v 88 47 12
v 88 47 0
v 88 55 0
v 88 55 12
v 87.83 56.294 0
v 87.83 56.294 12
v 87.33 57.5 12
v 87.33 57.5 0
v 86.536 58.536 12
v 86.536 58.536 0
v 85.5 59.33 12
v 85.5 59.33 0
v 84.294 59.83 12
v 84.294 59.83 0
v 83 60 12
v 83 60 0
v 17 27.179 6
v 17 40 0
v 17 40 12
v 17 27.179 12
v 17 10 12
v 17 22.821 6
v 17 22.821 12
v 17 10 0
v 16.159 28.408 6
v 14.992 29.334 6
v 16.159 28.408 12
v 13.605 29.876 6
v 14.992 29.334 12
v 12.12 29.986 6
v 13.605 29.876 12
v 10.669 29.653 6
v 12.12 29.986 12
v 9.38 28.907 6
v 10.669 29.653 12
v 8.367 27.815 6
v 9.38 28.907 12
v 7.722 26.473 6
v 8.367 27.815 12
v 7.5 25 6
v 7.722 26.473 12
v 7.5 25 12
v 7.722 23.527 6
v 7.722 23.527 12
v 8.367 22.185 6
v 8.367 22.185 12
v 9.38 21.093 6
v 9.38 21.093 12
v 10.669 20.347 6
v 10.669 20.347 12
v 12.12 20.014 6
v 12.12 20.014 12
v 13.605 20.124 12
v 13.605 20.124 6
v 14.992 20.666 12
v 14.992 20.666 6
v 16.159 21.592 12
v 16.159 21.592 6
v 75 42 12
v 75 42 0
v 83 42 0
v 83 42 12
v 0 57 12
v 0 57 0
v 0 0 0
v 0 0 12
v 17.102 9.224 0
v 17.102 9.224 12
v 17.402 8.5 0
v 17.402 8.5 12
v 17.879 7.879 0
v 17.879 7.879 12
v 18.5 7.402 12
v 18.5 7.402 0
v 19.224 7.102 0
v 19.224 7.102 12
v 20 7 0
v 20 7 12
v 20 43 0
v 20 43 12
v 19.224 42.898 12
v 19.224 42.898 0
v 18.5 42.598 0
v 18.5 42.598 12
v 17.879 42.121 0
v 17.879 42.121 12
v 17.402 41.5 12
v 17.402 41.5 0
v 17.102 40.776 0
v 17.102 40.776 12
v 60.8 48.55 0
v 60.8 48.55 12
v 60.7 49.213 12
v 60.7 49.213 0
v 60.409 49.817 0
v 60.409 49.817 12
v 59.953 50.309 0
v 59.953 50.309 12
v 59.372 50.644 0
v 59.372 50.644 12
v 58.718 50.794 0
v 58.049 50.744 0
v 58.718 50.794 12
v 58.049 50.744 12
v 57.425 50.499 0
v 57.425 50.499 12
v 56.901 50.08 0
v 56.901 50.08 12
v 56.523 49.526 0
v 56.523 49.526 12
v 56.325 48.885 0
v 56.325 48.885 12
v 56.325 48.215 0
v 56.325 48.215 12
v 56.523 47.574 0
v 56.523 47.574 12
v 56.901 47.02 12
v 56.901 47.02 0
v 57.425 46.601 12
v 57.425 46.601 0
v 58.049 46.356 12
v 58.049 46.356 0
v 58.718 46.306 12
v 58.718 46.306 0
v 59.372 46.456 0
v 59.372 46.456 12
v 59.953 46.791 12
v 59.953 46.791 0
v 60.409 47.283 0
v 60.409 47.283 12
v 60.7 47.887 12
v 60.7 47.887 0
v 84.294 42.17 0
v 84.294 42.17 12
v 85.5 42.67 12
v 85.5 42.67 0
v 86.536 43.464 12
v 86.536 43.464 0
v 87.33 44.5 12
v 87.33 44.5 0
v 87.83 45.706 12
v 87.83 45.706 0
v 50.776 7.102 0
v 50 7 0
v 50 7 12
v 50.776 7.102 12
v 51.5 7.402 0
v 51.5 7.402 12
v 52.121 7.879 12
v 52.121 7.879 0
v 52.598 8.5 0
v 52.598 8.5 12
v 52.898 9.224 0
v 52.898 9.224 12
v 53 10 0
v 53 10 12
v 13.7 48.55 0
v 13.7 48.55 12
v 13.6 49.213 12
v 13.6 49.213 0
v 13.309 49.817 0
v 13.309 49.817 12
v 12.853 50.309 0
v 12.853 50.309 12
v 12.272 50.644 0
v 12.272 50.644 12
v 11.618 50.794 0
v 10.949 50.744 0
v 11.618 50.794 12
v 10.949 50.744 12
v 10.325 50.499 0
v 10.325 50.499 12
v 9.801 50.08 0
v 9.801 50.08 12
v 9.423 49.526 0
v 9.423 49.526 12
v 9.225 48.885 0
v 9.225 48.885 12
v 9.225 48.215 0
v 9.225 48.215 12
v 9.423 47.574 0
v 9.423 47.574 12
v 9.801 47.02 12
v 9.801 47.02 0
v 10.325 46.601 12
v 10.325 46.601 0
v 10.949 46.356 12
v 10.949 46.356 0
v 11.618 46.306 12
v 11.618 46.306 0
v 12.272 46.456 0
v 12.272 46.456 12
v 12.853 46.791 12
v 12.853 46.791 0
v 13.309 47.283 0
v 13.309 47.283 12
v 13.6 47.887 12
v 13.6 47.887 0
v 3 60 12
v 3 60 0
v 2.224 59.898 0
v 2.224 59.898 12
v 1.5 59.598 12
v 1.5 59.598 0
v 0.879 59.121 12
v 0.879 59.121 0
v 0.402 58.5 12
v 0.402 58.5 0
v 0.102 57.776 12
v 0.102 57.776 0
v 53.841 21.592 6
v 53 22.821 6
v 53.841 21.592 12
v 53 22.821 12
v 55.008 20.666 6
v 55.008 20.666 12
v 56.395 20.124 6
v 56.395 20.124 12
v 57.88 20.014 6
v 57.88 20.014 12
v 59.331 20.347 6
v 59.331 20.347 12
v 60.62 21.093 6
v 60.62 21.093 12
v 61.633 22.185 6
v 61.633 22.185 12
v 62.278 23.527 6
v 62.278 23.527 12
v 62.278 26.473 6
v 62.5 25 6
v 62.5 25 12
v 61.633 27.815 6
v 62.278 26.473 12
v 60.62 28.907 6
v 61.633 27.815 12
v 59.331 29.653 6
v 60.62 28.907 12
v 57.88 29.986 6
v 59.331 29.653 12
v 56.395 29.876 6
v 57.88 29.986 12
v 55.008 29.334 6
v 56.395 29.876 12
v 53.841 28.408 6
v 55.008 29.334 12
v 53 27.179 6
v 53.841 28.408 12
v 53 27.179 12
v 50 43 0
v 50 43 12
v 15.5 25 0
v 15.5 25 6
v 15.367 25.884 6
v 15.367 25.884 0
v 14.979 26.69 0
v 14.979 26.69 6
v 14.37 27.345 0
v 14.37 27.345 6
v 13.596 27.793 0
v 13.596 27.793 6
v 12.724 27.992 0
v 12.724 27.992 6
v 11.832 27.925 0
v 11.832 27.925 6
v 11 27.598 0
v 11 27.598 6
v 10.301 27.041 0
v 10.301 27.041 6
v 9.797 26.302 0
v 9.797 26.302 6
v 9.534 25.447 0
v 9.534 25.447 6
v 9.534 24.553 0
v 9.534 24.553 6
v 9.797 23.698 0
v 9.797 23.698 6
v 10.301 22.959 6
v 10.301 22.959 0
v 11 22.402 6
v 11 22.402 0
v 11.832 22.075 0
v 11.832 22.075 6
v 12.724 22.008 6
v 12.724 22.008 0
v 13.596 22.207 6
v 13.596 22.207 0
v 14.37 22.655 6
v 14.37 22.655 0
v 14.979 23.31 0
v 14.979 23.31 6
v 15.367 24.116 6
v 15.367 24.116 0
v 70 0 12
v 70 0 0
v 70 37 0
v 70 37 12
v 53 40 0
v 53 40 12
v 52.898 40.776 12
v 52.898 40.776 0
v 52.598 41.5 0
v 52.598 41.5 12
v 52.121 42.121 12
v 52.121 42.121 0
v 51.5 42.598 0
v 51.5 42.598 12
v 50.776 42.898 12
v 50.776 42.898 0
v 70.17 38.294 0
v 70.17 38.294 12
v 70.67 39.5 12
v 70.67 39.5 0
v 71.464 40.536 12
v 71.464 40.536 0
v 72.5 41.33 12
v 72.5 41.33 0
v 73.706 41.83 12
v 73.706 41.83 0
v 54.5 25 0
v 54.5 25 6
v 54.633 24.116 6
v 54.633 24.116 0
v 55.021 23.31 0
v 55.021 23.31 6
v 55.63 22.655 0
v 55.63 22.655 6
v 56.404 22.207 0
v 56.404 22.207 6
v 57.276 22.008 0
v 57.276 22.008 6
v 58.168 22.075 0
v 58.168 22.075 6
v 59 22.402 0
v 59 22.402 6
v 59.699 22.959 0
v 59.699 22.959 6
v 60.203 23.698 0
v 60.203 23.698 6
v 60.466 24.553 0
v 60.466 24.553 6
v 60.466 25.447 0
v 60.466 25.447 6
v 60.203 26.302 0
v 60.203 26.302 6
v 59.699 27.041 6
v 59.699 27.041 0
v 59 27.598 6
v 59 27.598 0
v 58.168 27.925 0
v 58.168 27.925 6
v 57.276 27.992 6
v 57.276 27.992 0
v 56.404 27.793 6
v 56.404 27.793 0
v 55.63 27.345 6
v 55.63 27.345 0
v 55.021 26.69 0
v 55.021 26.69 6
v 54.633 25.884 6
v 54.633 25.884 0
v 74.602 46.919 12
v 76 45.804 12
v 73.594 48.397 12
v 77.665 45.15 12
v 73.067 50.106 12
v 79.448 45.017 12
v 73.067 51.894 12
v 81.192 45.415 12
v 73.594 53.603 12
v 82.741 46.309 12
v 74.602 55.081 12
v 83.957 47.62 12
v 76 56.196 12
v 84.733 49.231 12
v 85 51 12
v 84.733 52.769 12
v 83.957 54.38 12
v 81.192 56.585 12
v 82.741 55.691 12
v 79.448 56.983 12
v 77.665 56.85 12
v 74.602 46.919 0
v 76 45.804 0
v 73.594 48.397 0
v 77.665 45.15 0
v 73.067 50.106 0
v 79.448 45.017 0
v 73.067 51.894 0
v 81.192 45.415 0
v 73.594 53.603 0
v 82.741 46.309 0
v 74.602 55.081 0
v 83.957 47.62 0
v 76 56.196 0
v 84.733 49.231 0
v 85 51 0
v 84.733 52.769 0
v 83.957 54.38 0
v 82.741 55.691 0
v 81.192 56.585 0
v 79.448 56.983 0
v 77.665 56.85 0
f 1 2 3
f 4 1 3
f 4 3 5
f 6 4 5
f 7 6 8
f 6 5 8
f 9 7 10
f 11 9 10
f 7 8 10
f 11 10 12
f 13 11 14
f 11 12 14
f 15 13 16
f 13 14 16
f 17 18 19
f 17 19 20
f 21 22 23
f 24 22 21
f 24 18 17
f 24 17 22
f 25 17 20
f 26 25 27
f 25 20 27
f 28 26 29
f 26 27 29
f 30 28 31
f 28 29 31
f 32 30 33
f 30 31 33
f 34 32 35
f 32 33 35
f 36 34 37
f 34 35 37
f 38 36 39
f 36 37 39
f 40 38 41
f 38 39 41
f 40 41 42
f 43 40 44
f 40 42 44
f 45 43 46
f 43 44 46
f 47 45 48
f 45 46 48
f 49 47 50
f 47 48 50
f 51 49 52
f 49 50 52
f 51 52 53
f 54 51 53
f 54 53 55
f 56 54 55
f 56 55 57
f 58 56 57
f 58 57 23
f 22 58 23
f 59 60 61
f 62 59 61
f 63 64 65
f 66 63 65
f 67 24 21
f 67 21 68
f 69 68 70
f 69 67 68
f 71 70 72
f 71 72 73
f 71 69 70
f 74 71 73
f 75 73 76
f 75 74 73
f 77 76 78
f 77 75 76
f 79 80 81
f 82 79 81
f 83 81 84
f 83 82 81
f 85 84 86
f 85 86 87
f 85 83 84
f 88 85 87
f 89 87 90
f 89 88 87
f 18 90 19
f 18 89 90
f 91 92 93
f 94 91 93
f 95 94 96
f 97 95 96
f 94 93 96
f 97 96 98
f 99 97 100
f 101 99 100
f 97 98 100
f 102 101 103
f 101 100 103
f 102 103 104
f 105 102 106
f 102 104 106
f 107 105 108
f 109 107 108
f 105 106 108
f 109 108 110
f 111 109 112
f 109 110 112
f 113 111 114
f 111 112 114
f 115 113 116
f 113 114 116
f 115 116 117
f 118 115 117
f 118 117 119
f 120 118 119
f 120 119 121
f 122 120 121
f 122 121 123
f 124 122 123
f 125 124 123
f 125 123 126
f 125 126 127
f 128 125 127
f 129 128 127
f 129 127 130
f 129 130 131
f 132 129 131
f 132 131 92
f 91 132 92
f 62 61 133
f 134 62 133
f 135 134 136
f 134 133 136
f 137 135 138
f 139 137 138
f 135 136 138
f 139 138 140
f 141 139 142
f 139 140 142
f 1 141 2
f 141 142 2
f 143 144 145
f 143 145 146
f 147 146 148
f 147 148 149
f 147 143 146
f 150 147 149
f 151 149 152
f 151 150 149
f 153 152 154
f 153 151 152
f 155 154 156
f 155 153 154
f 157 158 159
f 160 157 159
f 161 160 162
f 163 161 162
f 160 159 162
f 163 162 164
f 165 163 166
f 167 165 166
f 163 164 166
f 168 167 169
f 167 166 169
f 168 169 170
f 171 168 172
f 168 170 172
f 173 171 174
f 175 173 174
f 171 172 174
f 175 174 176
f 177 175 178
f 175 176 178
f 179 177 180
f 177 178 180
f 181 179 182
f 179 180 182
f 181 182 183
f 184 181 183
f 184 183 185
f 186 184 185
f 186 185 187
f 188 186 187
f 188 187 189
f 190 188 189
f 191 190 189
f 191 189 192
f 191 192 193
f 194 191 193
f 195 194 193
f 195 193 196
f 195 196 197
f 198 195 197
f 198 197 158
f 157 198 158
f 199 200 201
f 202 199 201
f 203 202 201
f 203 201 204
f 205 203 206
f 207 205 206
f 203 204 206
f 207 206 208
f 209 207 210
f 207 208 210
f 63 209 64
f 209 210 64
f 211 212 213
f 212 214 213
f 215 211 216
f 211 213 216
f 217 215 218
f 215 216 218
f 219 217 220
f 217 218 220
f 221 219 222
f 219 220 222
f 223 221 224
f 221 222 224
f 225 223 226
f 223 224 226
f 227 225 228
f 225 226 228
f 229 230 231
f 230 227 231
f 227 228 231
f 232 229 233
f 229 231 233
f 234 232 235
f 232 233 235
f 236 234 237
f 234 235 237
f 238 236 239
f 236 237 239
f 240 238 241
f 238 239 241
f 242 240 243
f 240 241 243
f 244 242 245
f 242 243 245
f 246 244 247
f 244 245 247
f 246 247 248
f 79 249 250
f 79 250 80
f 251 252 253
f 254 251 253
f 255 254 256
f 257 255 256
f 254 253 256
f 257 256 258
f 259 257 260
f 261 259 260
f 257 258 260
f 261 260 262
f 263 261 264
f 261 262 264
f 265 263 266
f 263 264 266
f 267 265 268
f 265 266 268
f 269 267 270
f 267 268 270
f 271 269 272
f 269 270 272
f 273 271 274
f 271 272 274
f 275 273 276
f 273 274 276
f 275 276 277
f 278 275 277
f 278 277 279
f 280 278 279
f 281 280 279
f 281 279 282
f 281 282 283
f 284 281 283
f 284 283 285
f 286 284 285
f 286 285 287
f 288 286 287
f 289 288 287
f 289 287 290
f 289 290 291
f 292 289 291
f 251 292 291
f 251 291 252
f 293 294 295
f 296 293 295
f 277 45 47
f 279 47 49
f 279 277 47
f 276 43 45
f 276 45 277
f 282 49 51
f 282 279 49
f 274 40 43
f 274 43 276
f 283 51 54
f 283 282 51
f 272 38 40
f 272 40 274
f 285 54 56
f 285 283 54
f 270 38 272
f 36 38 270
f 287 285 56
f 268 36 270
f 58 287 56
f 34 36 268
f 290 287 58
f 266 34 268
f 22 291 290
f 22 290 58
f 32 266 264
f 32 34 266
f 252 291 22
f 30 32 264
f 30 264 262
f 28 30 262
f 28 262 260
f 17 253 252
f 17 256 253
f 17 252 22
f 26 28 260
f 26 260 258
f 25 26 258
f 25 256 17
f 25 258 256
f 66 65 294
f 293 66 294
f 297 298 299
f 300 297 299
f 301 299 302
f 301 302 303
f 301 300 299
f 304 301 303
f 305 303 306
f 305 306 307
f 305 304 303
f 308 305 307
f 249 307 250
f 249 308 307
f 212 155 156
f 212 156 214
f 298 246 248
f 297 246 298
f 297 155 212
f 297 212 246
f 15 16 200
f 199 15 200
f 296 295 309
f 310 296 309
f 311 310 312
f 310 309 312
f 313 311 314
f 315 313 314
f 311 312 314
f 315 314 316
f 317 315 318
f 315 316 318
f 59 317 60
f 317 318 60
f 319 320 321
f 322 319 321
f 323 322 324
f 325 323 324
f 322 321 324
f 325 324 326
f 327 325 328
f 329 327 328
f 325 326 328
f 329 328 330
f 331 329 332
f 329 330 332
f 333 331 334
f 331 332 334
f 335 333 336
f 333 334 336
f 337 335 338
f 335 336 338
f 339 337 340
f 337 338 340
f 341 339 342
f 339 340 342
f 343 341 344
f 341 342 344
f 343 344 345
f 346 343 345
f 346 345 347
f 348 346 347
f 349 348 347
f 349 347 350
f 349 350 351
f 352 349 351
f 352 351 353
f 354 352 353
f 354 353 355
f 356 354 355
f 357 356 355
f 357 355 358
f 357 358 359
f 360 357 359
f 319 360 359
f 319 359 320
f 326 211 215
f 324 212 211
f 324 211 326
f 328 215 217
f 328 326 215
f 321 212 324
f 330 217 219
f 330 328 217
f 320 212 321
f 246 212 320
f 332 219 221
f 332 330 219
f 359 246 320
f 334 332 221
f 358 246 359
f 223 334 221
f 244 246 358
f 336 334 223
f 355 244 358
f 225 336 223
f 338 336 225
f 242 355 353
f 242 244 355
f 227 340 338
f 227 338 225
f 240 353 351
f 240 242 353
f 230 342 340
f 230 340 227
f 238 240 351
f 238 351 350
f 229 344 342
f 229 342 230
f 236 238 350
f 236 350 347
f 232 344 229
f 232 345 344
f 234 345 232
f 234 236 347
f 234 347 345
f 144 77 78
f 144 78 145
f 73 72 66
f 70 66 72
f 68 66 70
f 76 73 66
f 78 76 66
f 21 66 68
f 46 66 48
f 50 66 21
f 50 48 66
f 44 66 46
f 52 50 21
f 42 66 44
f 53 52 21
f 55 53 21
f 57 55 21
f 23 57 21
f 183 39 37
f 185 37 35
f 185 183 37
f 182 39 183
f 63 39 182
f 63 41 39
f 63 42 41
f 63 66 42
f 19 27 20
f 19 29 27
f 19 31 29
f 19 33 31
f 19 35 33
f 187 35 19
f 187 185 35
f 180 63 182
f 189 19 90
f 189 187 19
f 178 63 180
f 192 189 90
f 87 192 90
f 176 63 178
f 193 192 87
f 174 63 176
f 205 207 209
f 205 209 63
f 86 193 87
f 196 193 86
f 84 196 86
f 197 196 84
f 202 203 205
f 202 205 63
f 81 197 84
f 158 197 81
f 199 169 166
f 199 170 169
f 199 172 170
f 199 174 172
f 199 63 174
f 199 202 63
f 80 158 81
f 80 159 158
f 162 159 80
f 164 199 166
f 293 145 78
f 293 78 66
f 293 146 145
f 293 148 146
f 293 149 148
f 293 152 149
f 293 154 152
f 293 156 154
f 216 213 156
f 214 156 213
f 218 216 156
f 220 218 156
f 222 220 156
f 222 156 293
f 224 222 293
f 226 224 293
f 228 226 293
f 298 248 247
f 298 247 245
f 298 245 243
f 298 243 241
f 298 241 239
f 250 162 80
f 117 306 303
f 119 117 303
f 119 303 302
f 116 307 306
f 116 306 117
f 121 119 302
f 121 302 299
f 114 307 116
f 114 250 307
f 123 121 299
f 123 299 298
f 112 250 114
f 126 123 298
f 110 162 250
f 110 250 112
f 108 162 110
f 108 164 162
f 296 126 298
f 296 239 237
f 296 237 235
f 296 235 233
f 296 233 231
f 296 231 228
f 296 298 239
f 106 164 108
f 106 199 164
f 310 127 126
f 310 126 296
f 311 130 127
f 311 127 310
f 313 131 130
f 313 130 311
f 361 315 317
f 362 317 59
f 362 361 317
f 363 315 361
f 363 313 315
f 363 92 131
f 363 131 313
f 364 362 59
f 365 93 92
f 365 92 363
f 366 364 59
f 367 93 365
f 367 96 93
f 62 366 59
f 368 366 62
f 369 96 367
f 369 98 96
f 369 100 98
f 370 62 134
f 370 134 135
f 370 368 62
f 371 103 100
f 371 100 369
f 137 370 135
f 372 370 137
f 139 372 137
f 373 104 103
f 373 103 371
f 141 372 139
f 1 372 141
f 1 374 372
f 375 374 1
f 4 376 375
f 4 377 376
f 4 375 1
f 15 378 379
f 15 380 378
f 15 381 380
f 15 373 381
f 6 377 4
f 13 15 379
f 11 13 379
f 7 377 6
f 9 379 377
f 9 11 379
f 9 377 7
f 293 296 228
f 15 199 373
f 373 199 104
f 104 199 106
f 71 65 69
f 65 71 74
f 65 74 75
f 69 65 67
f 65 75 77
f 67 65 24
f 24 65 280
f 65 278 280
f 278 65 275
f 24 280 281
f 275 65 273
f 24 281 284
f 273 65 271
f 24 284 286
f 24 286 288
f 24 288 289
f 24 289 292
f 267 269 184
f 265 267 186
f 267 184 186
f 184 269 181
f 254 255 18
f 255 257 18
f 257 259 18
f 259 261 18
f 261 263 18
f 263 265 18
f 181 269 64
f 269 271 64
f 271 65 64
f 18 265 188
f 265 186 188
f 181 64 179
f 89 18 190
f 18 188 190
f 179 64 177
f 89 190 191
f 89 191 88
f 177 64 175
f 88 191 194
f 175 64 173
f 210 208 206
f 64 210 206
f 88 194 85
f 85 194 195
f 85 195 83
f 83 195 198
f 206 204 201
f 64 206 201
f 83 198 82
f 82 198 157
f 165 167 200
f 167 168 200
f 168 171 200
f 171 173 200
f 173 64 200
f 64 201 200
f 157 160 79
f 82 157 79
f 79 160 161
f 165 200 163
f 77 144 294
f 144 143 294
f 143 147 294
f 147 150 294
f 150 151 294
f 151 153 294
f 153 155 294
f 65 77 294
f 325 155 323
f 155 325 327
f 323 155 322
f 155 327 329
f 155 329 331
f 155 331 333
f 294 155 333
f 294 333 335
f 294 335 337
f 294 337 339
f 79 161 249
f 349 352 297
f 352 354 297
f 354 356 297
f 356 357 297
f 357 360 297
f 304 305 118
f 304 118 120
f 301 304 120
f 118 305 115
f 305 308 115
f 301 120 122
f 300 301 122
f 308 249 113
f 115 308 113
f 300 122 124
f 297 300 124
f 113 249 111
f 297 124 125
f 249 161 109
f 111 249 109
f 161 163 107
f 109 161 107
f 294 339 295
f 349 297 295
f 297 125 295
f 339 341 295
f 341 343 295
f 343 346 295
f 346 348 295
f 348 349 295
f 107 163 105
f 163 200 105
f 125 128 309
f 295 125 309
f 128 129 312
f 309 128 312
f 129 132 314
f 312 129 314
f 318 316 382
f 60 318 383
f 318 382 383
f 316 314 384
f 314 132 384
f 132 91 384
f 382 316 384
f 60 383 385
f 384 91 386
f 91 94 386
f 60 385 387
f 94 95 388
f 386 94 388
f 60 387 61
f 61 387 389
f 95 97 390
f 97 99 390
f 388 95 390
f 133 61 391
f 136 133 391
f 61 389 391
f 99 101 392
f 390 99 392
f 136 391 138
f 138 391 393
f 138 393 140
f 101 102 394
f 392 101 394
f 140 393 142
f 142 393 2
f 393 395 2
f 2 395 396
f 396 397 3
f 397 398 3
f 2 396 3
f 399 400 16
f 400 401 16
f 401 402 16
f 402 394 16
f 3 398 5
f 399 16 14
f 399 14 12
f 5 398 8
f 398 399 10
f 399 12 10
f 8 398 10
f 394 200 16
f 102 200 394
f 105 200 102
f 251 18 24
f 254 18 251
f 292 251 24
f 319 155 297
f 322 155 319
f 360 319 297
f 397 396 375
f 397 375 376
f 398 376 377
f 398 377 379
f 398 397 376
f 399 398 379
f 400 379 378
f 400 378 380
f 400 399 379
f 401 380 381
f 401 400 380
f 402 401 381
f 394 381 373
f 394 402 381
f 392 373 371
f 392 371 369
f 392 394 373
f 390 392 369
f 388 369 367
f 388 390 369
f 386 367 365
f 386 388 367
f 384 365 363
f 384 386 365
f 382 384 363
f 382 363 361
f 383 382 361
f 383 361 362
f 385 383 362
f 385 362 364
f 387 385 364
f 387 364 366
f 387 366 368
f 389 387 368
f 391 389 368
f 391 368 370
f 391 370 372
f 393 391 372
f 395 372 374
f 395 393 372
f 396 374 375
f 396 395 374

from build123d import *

# Parameters (mm, degrees)
ESQUISSE1_R             = 6
BOSS_EXTRU_1_DEPTH      = 12
ESQUISSE2_R             = 3
ENL_V_MAT_EXTRU_1_DEPTH = 12
ESQUISSE3_R             = 5
ENL_V_MAT_EXTRU_2_DEPTH = 6
ENL_V_MAT_EXTRU_3_REACH = 109.182
ESQUISSE4_R             = 2.25


with BuildPart() as part:
    # Esquisse1 → Boss.-Extru.1 (new body)
    with BuildSketch(Plane.XY):
        with BuildLine():
            Line((0, 0), (70, 0))
            Line((70, 0), (70, 37))
            ThreePointArc((70, 37), (71.464466094, 40.535533906), (75, 42))
            Line((75, 42), (83, 42))
            ThreePointArc((83, 42), (86.535533906, 43.464466094), (88, 47))
            Line((88, 47), (88, 55))
            ThreePointArc((88, 55), (86.535533906, 58.535533906), (83, 60))
            Line((83, 60), (70, 60))
            Line((70, 60), (3, 60))
            ThreePointArc((3, 60), (0.878679656, 59.121320344), (0, 57))
            Line((0, 57), (0, 0))
        make_face()
        with Locations((79, 51)):
            Circle(ESQUISSE1_R, mode=Mode.SUBTRACT)
        with BuildLine():
            Line((20, 7), (50, 7))
            ThreePointArc((50, 7), (52.121320344, 7.878679656), (53, 10))
            Line((53, 10), (53, 40))
            ThreePointArc((53, 40), (52.121320344, 42.121320344), (50, 43))
            Line((50, 43), (20, 43))
            ThreePointArc((20, 43), (17.878679656, 42.121320344), (17, 40))
            Line((17, 40), (17, 10))
            ThreePointArc((17, 10), (17.878679656, 7.878679656), (20, 7))
        make_face(mode=Mode.SUBTRACT)
    extrude(amount=BOSS_EXTRU_1_DEPTH)

    # Esquisse2 → Enlèv. mat.-Extru.1 (cut)
    with BuildSketch(Plane.XY.offset(12)):
        with Locations((12.5, 25)):
            Circle(ESQUISSE2_R)
        with Locations(Location((57.5, 25, 0), (0, 0, 180))):
            Circle(ESQUISSE2_R)
    extrude(amount=-ENL_V_MAT_EXTRU_1_DEPTH, mode=Mode.SUBTRACT)

    # Esquisse3 → Enlèv. mat.-Extru.2 (cut)
    with BuildSketch(Plane.XY.offset(12)):
        with Locations((12.5, 25)):
            Circle(ESQUISSE3_R)
        with Locations((57.5, 25)):
            Circle(ESQUISSE3_R)
    extrude(amount=-ENL_V_MAT_EXTRU_2_DEPTH, mode=Mode.SUBTRACT)

    # Esquisse4 → Enlèv. mat.-Extru.3 (cut, up to next)
    with BuildSketch(Plane.XY.offset(12), mode=Mode.PRIVATE) as enl_v_mat_extru_3_sk1:
        with Locations((11.45, 48.55)):
            Circle(ESQUISSE4_R)
    enl_v_mat_extru_3_tool1 = extrude(enl_v_mat_extru_3_sk1.sketch, amount=-ENL_V_MAT_EXTRU_3_REACH, mode=Mode.PRIVATE) & part.part
    # Esquisse4 → Enlèv. mat.-Extru.3 (cut, up to next)
    with BuildSketch(Plane.XY.offset(12), mode=Mode.PRIVATE) as enl_v_mat_extru_3_sk2:
        with Locations((58.55, 48.55)):
            Circle(ESQUISSE4_R)
    enl_v_mat_extru_3_tool2 = extrude(enl_v_mat_extru_3_sk2.sketch, amount=-ENL_V_MAT_EXTRU_3_REACH, mode=Mode.PRIVATE) & part.part
    add(enl_v_mat_extru_3_tool1.solids().sort_by_distance((11.45, 48.55, 12))[0], mode=Mode.SUBTRACT)
    add(enl_v_mat_extru_3_tool2.solids().sort_by_distance((58.55, 48.55, 12))[0], mode=Mode.SUBTRACT)


solid = part.part
